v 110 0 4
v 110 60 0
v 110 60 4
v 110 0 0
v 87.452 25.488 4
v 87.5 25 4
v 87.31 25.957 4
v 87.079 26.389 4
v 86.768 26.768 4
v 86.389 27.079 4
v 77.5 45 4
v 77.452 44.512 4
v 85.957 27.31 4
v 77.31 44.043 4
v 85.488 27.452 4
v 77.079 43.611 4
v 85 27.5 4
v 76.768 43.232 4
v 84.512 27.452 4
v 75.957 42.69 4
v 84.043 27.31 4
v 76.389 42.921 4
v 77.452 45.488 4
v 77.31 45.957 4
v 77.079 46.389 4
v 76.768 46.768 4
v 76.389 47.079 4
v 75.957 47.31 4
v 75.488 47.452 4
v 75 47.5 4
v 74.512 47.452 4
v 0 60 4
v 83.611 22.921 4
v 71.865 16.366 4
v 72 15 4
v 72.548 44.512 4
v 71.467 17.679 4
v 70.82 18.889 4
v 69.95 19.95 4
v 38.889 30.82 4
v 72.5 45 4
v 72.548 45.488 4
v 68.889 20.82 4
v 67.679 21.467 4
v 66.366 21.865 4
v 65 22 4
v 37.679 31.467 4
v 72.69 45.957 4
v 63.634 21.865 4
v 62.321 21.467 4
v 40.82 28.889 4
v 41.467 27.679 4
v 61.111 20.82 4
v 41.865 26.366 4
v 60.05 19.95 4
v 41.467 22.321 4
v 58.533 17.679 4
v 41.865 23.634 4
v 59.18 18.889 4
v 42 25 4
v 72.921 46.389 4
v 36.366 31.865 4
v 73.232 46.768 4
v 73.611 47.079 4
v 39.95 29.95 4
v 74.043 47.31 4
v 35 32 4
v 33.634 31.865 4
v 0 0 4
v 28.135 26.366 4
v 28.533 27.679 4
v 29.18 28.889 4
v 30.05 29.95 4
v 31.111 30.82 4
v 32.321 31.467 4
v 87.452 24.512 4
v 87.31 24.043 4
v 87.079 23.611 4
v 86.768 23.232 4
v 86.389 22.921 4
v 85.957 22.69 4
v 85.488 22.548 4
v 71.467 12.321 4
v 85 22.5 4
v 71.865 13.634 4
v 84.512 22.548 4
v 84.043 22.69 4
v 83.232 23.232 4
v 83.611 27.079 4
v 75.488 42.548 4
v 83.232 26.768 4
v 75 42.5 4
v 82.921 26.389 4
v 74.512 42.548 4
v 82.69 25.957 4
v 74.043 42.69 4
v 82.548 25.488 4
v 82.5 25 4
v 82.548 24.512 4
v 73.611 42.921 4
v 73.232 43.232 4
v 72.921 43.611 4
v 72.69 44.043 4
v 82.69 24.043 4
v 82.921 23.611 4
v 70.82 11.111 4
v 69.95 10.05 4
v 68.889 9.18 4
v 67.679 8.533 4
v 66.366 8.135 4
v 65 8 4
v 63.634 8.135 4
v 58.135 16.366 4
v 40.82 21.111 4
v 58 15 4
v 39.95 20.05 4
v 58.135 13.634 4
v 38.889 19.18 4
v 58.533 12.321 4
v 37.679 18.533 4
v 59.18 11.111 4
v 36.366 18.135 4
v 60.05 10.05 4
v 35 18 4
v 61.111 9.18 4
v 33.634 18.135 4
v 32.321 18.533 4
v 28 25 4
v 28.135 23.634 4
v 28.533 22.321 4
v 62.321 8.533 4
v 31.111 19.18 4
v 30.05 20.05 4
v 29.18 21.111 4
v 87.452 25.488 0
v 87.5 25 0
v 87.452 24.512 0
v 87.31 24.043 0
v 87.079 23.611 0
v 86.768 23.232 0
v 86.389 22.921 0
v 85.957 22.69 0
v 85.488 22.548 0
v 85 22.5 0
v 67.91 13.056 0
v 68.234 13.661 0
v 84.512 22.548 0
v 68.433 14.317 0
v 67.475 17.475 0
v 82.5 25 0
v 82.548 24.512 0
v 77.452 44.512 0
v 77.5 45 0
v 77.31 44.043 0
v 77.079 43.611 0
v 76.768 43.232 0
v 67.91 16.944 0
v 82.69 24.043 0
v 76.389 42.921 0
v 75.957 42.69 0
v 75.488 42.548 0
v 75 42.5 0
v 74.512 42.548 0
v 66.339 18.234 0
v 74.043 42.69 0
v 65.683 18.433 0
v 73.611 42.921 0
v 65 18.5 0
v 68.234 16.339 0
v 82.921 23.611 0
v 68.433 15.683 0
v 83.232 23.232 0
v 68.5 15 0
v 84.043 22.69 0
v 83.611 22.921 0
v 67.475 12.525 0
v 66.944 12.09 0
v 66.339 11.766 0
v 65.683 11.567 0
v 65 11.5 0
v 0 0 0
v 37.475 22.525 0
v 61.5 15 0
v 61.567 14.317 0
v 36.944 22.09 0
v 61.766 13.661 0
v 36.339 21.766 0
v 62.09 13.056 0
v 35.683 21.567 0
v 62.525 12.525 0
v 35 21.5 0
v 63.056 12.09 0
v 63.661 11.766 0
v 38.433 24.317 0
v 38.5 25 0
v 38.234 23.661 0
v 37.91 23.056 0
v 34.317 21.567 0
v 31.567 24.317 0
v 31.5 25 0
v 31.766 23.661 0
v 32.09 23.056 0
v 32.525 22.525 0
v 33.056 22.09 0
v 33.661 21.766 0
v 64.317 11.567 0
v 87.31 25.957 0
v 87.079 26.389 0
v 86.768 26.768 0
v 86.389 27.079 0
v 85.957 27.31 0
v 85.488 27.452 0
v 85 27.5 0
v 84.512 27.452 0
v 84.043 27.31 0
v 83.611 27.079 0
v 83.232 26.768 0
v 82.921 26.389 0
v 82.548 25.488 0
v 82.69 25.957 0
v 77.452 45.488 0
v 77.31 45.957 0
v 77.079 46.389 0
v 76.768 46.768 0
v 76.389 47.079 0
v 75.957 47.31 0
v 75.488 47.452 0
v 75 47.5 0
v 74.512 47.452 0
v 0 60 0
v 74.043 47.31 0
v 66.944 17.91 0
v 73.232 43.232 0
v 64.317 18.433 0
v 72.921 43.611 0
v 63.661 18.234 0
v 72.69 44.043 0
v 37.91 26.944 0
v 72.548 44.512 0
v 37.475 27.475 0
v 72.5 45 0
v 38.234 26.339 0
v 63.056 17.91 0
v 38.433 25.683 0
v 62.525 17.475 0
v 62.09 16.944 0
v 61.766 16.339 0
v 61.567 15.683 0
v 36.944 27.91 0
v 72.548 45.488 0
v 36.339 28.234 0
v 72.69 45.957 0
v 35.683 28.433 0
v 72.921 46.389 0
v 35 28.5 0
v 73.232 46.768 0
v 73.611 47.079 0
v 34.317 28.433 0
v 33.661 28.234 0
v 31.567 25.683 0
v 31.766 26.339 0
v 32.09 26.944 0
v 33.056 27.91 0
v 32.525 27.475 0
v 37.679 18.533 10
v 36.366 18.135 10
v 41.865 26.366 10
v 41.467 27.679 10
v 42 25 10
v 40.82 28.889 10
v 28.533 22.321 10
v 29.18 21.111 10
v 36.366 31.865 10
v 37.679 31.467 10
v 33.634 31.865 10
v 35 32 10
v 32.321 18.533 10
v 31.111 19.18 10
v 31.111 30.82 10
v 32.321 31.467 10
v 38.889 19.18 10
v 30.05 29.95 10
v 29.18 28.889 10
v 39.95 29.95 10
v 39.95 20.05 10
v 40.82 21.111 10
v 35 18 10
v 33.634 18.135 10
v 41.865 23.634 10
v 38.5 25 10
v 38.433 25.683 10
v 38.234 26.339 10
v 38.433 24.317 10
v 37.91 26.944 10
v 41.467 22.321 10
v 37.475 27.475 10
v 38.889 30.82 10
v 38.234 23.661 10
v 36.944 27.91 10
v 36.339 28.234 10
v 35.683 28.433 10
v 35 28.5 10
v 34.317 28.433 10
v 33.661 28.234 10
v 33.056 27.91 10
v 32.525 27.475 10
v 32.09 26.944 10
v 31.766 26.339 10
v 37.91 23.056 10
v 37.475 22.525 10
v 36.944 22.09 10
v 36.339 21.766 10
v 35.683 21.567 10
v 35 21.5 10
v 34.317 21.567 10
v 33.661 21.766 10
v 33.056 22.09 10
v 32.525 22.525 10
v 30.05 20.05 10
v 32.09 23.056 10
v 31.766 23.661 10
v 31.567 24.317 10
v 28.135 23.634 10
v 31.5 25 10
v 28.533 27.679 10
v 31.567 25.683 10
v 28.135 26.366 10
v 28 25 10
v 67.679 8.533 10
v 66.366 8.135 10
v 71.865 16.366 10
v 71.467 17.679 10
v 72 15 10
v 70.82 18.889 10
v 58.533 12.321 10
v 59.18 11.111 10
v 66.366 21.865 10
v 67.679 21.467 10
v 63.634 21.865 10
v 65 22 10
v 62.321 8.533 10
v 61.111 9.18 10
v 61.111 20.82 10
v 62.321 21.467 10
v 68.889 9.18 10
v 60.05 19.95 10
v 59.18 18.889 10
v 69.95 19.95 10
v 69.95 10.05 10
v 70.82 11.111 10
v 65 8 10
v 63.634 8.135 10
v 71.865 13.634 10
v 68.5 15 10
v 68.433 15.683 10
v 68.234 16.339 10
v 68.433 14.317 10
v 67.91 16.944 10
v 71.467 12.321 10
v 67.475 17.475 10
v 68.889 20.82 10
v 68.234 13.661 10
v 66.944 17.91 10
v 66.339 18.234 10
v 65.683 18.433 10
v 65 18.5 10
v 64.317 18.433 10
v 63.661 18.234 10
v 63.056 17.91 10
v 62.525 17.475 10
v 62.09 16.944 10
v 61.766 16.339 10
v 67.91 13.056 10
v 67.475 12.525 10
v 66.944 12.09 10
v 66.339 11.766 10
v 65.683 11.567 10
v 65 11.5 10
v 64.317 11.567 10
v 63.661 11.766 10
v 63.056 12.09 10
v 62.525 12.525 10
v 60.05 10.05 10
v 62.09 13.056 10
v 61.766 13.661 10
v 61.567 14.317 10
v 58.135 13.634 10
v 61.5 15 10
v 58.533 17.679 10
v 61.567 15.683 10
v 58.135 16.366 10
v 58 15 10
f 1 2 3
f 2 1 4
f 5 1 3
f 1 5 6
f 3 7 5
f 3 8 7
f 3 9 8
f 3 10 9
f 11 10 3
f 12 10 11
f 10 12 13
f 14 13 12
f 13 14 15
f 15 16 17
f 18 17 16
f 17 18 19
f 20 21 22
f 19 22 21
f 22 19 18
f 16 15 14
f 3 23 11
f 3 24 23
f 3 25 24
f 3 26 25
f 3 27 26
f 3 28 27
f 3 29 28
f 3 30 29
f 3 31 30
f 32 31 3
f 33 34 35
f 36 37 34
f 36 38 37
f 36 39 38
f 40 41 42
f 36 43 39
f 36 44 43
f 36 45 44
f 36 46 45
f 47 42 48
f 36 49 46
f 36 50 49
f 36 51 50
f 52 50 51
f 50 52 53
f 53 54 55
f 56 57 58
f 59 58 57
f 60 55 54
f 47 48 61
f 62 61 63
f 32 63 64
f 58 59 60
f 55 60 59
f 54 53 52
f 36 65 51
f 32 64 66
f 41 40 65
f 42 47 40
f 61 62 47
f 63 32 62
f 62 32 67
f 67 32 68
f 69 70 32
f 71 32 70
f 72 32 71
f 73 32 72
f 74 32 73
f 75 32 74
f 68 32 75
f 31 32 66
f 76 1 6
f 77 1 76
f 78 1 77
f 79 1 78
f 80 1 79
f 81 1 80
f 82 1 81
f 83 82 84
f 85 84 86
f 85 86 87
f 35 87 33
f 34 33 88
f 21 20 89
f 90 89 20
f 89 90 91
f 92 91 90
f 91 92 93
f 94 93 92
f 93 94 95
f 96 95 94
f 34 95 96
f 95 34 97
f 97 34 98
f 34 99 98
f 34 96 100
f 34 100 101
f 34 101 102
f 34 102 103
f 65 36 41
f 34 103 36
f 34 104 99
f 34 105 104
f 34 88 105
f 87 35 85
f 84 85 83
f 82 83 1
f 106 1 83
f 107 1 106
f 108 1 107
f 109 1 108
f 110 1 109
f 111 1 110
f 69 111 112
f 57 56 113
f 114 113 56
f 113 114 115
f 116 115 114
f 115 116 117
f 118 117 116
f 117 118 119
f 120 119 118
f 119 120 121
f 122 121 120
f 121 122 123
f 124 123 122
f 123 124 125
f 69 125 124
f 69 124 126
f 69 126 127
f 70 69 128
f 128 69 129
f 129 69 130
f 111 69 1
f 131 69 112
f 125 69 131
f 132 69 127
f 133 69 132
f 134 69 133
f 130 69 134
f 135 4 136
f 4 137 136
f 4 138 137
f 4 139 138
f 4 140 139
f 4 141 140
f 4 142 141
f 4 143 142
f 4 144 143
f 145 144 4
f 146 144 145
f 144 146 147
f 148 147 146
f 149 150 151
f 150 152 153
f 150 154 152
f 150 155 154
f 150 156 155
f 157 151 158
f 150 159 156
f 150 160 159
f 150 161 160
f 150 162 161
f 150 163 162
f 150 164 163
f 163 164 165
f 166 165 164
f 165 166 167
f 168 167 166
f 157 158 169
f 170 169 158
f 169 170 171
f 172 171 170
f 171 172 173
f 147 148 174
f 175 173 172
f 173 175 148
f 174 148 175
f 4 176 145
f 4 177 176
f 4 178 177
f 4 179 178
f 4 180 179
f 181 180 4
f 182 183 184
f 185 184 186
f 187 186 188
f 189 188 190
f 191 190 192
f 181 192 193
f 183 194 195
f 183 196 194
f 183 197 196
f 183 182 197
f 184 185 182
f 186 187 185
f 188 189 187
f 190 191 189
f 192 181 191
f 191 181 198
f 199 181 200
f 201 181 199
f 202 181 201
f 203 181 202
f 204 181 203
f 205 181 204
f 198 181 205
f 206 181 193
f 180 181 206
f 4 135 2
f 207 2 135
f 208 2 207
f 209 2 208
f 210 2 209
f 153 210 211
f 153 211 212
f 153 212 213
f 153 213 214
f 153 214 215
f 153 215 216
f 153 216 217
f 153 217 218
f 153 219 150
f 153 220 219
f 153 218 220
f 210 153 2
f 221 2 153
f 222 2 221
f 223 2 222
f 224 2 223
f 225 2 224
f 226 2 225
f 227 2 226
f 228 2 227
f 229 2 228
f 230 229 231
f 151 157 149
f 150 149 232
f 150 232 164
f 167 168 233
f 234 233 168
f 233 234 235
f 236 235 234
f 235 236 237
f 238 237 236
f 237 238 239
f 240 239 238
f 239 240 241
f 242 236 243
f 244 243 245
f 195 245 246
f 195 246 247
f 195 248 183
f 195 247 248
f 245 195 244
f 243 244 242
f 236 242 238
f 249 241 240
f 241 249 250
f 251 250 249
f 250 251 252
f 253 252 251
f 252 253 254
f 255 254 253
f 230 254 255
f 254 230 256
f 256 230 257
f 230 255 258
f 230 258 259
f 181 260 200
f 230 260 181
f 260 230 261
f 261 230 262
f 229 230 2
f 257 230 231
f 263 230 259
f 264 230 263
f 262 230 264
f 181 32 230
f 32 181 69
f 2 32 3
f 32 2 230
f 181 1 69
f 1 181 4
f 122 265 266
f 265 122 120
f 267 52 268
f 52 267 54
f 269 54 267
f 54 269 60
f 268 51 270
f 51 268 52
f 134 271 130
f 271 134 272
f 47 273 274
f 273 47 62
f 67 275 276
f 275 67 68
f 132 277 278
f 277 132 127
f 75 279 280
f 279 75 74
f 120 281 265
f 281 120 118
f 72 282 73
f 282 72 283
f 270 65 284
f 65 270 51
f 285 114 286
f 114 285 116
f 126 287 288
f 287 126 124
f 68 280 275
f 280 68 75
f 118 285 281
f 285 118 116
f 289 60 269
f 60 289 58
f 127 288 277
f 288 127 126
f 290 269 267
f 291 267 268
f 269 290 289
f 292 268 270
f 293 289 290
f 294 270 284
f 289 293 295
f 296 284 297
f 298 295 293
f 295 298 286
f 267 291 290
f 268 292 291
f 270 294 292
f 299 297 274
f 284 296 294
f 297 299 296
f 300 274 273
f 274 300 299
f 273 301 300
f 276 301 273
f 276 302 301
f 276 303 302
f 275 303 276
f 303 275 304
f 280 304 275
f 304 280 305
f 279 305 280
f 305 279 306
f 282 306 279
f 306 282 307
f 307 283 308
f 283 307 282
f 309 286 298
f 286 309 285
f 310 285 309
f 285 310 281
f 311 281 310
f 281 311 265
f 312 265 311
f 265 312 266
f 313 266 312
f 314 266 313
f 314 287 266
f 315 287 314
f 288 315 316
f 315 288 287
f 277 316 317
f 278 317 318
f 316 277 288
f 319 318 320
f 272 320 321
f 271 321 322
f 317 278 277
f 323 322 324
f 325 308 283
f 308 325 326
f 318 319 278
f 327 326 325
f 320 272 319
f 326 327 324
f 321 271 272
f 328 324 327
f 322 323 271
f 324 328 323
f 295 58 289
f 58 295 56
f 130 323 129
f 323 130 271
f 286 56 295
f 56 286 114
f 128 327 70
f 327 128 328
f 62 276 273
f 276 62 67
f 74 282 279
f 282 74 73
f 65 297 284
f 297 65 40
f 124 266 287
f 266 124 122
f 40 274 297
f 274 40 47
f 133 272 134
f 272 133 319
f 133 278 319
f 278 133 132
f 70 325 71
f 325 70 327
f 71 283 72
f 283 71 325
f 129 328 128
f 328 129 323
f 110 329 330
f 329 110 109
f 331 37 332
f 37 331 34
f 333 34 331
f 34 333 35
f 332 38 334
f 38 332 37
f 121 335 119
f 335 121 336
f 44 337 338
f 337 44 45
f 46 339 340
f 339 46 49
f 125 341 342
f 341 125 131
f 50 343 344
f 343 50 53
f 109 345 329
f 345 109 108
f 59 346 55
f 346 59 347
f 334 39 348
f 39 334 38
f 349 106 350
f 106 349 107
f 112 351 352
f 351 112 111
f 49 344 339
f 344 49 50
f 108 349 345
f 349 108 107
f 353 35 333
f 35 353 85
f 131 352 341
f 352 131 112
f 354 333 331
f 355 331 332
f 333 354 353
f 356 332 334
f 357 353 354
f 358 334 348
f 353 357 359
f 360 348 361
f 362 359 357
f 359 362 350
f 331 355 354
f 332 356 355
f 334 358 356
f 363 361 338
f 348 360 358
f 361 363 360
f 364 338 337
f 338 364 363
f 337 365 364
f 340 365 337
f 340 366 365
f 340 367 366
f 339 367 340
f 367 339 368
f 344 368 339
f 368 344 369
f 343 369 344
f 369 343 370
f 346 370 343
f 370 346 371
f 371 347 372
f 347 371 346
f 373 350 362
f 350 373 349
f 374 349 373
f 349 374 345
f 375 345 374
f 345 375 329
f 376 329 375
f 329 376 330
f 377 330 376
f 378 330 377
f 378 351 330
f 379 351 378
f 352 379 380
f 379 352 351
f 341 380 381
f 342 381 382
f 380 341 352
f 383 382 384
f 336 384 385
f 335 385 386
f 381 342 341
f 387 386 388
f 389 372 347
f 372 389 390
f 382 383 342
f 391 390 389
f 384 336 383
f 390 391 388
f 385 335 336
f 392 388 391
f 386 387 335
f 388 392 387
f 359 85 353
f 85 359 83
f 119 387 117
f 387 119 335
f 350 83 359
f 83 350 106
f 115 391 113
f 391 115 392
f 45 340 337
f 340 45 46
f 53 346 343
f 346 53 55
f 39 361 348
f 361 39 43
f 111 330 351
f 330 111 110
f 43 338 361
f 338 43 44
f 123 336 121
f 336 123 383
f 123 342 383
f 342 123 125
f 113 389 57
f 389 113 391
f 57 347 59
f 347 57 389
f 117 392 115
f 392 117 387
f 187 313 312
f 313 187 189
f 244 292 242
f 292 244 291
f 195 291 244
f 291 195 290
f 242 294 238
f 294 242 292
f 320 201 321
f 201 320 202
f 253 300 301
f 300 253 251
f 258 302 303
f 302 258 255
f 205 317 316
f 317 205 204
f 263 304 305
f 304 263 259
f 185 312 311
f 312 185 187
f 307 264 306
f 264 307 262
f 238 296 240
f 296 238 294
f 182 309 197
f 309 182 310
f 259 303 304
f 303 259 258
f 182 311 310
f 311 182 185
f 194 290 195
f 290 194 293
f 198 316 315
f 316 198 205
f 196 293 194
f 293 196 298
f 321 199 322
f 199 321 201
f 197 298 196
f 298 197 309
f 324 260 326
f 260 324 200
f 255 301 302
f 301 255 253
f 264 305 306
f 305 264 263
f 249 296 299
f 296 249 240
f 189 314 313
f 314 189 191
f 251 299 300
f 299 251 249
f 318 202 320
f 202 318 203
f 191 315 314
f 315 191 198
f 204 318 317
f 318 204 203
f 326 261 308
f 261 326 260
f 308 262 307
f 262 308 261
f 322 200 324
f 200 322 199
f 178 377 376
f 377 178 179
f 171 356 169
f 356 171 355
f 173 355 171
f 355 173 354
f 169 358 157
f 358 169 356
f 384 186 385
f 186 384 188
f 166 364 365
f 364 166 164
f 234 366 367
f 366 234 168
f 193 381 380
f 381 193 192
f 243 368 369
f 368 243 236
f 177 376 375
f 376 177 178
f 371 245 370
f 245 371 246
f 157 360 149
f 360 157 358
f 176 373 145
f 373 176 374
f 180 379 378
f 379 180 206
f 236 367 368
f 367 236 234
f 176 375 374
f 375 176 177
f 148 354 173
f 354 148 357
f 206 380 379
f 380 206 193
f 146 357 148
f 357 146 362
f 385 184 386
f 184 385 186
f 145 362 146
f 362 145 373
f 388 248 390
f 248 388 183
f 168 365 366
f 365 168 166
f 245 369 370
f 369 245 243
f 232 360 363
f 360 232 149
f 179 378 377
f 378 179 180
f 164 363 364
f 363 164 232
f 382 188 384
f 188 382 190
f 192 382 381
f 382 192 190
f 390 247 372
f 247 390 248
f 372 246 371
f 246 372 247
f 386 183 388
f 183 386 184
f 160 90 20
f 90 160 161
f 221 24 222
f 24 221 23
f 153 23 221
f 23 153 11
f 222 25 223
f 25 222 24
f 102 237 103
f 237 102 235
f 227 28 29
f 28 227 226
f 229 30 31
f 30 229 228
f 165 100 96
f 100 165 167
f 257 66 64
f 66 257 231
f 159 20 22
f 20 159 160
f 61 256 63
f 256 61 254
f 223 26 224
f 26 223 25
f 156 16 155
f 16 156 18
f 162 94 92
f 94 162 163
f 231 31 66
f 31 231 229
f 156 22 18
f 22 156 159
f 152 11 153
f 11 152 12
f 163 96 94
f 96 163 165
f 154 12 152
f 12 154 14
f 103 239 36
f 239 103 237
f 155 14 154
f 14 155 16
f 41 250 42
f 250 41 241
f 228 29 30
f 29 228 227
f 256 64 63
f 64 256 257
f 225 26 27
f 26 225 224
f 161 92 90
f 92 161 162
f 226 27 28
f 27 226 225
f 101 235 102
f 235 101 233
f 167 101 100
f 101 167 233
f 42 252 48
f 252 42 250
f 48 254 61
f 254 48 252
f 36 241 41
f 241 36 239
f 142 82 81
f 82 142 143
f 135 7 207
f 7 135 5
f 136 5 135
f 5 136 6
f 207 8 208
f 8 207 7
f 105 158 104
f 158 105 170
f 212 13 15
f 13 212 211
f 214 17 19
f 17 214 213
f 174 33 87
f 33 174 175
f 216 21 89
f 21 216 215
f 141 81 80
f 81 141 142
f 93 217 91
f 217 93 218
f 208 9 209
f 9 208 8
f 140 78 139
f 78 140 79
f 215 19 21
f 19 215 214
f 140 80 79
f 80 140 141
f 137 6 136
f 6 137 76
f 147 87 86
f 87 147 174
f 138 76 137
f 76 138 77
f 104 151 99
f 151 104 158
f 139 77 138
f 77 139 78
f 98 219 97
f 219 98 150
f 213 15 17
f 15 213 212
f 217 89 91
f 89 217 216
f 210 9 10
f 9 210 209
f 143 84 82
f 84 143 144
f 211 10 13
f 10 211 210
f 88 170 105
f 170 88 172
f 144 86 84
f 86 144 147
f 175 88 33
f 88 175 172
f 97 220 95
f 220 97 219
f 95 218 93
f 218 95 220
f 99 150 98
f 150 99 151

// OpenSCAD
$fn = 32;

// ----------------------------------------------------------------------
// Mixed field: bosses and holes at given coordinates
// ----------------------------------------------------------------------

// --- parameters (mm) ---
plate_l = 110;            // plate length, X
plate_w = 60;             // plate width, Y
plate_t = 4;              // plate thickness, Z
boss_d = 14;              // boss diameter
boss_h = 6;               // boss height above the plate
hole_d = 5;               // through hole diameter
fit_tol = 0.1;            // tolerance for press fits, mm
free_tol = 0.5;           // tolerance for clearance fits, mm

total_h = plate_t + boss_h;  // overall height

difference() {
  union() {
    cube([plate_l, plate_w, plate_t]);
    translate([35, 25, plate_t]) cylinder(h = boss_h, d = boss_d);
    translate([65, 15, plate_t]) cylinder(h = boss_h, d = boss_d);
  }
  translate([35, 25, -1]) cylinder(h = total_h + 2, d = boss_d / 2);
  translate([65, 15, -1]) cylinder(h = total_h + 2, d = boss_d / 2);
  translate([75, 45, -1]) cylinder(h = plate_t + 2, d = hole_d);
  translate([85, 25, -1]) cylinder(h = plate_t + 2, d = hole_d);
}
